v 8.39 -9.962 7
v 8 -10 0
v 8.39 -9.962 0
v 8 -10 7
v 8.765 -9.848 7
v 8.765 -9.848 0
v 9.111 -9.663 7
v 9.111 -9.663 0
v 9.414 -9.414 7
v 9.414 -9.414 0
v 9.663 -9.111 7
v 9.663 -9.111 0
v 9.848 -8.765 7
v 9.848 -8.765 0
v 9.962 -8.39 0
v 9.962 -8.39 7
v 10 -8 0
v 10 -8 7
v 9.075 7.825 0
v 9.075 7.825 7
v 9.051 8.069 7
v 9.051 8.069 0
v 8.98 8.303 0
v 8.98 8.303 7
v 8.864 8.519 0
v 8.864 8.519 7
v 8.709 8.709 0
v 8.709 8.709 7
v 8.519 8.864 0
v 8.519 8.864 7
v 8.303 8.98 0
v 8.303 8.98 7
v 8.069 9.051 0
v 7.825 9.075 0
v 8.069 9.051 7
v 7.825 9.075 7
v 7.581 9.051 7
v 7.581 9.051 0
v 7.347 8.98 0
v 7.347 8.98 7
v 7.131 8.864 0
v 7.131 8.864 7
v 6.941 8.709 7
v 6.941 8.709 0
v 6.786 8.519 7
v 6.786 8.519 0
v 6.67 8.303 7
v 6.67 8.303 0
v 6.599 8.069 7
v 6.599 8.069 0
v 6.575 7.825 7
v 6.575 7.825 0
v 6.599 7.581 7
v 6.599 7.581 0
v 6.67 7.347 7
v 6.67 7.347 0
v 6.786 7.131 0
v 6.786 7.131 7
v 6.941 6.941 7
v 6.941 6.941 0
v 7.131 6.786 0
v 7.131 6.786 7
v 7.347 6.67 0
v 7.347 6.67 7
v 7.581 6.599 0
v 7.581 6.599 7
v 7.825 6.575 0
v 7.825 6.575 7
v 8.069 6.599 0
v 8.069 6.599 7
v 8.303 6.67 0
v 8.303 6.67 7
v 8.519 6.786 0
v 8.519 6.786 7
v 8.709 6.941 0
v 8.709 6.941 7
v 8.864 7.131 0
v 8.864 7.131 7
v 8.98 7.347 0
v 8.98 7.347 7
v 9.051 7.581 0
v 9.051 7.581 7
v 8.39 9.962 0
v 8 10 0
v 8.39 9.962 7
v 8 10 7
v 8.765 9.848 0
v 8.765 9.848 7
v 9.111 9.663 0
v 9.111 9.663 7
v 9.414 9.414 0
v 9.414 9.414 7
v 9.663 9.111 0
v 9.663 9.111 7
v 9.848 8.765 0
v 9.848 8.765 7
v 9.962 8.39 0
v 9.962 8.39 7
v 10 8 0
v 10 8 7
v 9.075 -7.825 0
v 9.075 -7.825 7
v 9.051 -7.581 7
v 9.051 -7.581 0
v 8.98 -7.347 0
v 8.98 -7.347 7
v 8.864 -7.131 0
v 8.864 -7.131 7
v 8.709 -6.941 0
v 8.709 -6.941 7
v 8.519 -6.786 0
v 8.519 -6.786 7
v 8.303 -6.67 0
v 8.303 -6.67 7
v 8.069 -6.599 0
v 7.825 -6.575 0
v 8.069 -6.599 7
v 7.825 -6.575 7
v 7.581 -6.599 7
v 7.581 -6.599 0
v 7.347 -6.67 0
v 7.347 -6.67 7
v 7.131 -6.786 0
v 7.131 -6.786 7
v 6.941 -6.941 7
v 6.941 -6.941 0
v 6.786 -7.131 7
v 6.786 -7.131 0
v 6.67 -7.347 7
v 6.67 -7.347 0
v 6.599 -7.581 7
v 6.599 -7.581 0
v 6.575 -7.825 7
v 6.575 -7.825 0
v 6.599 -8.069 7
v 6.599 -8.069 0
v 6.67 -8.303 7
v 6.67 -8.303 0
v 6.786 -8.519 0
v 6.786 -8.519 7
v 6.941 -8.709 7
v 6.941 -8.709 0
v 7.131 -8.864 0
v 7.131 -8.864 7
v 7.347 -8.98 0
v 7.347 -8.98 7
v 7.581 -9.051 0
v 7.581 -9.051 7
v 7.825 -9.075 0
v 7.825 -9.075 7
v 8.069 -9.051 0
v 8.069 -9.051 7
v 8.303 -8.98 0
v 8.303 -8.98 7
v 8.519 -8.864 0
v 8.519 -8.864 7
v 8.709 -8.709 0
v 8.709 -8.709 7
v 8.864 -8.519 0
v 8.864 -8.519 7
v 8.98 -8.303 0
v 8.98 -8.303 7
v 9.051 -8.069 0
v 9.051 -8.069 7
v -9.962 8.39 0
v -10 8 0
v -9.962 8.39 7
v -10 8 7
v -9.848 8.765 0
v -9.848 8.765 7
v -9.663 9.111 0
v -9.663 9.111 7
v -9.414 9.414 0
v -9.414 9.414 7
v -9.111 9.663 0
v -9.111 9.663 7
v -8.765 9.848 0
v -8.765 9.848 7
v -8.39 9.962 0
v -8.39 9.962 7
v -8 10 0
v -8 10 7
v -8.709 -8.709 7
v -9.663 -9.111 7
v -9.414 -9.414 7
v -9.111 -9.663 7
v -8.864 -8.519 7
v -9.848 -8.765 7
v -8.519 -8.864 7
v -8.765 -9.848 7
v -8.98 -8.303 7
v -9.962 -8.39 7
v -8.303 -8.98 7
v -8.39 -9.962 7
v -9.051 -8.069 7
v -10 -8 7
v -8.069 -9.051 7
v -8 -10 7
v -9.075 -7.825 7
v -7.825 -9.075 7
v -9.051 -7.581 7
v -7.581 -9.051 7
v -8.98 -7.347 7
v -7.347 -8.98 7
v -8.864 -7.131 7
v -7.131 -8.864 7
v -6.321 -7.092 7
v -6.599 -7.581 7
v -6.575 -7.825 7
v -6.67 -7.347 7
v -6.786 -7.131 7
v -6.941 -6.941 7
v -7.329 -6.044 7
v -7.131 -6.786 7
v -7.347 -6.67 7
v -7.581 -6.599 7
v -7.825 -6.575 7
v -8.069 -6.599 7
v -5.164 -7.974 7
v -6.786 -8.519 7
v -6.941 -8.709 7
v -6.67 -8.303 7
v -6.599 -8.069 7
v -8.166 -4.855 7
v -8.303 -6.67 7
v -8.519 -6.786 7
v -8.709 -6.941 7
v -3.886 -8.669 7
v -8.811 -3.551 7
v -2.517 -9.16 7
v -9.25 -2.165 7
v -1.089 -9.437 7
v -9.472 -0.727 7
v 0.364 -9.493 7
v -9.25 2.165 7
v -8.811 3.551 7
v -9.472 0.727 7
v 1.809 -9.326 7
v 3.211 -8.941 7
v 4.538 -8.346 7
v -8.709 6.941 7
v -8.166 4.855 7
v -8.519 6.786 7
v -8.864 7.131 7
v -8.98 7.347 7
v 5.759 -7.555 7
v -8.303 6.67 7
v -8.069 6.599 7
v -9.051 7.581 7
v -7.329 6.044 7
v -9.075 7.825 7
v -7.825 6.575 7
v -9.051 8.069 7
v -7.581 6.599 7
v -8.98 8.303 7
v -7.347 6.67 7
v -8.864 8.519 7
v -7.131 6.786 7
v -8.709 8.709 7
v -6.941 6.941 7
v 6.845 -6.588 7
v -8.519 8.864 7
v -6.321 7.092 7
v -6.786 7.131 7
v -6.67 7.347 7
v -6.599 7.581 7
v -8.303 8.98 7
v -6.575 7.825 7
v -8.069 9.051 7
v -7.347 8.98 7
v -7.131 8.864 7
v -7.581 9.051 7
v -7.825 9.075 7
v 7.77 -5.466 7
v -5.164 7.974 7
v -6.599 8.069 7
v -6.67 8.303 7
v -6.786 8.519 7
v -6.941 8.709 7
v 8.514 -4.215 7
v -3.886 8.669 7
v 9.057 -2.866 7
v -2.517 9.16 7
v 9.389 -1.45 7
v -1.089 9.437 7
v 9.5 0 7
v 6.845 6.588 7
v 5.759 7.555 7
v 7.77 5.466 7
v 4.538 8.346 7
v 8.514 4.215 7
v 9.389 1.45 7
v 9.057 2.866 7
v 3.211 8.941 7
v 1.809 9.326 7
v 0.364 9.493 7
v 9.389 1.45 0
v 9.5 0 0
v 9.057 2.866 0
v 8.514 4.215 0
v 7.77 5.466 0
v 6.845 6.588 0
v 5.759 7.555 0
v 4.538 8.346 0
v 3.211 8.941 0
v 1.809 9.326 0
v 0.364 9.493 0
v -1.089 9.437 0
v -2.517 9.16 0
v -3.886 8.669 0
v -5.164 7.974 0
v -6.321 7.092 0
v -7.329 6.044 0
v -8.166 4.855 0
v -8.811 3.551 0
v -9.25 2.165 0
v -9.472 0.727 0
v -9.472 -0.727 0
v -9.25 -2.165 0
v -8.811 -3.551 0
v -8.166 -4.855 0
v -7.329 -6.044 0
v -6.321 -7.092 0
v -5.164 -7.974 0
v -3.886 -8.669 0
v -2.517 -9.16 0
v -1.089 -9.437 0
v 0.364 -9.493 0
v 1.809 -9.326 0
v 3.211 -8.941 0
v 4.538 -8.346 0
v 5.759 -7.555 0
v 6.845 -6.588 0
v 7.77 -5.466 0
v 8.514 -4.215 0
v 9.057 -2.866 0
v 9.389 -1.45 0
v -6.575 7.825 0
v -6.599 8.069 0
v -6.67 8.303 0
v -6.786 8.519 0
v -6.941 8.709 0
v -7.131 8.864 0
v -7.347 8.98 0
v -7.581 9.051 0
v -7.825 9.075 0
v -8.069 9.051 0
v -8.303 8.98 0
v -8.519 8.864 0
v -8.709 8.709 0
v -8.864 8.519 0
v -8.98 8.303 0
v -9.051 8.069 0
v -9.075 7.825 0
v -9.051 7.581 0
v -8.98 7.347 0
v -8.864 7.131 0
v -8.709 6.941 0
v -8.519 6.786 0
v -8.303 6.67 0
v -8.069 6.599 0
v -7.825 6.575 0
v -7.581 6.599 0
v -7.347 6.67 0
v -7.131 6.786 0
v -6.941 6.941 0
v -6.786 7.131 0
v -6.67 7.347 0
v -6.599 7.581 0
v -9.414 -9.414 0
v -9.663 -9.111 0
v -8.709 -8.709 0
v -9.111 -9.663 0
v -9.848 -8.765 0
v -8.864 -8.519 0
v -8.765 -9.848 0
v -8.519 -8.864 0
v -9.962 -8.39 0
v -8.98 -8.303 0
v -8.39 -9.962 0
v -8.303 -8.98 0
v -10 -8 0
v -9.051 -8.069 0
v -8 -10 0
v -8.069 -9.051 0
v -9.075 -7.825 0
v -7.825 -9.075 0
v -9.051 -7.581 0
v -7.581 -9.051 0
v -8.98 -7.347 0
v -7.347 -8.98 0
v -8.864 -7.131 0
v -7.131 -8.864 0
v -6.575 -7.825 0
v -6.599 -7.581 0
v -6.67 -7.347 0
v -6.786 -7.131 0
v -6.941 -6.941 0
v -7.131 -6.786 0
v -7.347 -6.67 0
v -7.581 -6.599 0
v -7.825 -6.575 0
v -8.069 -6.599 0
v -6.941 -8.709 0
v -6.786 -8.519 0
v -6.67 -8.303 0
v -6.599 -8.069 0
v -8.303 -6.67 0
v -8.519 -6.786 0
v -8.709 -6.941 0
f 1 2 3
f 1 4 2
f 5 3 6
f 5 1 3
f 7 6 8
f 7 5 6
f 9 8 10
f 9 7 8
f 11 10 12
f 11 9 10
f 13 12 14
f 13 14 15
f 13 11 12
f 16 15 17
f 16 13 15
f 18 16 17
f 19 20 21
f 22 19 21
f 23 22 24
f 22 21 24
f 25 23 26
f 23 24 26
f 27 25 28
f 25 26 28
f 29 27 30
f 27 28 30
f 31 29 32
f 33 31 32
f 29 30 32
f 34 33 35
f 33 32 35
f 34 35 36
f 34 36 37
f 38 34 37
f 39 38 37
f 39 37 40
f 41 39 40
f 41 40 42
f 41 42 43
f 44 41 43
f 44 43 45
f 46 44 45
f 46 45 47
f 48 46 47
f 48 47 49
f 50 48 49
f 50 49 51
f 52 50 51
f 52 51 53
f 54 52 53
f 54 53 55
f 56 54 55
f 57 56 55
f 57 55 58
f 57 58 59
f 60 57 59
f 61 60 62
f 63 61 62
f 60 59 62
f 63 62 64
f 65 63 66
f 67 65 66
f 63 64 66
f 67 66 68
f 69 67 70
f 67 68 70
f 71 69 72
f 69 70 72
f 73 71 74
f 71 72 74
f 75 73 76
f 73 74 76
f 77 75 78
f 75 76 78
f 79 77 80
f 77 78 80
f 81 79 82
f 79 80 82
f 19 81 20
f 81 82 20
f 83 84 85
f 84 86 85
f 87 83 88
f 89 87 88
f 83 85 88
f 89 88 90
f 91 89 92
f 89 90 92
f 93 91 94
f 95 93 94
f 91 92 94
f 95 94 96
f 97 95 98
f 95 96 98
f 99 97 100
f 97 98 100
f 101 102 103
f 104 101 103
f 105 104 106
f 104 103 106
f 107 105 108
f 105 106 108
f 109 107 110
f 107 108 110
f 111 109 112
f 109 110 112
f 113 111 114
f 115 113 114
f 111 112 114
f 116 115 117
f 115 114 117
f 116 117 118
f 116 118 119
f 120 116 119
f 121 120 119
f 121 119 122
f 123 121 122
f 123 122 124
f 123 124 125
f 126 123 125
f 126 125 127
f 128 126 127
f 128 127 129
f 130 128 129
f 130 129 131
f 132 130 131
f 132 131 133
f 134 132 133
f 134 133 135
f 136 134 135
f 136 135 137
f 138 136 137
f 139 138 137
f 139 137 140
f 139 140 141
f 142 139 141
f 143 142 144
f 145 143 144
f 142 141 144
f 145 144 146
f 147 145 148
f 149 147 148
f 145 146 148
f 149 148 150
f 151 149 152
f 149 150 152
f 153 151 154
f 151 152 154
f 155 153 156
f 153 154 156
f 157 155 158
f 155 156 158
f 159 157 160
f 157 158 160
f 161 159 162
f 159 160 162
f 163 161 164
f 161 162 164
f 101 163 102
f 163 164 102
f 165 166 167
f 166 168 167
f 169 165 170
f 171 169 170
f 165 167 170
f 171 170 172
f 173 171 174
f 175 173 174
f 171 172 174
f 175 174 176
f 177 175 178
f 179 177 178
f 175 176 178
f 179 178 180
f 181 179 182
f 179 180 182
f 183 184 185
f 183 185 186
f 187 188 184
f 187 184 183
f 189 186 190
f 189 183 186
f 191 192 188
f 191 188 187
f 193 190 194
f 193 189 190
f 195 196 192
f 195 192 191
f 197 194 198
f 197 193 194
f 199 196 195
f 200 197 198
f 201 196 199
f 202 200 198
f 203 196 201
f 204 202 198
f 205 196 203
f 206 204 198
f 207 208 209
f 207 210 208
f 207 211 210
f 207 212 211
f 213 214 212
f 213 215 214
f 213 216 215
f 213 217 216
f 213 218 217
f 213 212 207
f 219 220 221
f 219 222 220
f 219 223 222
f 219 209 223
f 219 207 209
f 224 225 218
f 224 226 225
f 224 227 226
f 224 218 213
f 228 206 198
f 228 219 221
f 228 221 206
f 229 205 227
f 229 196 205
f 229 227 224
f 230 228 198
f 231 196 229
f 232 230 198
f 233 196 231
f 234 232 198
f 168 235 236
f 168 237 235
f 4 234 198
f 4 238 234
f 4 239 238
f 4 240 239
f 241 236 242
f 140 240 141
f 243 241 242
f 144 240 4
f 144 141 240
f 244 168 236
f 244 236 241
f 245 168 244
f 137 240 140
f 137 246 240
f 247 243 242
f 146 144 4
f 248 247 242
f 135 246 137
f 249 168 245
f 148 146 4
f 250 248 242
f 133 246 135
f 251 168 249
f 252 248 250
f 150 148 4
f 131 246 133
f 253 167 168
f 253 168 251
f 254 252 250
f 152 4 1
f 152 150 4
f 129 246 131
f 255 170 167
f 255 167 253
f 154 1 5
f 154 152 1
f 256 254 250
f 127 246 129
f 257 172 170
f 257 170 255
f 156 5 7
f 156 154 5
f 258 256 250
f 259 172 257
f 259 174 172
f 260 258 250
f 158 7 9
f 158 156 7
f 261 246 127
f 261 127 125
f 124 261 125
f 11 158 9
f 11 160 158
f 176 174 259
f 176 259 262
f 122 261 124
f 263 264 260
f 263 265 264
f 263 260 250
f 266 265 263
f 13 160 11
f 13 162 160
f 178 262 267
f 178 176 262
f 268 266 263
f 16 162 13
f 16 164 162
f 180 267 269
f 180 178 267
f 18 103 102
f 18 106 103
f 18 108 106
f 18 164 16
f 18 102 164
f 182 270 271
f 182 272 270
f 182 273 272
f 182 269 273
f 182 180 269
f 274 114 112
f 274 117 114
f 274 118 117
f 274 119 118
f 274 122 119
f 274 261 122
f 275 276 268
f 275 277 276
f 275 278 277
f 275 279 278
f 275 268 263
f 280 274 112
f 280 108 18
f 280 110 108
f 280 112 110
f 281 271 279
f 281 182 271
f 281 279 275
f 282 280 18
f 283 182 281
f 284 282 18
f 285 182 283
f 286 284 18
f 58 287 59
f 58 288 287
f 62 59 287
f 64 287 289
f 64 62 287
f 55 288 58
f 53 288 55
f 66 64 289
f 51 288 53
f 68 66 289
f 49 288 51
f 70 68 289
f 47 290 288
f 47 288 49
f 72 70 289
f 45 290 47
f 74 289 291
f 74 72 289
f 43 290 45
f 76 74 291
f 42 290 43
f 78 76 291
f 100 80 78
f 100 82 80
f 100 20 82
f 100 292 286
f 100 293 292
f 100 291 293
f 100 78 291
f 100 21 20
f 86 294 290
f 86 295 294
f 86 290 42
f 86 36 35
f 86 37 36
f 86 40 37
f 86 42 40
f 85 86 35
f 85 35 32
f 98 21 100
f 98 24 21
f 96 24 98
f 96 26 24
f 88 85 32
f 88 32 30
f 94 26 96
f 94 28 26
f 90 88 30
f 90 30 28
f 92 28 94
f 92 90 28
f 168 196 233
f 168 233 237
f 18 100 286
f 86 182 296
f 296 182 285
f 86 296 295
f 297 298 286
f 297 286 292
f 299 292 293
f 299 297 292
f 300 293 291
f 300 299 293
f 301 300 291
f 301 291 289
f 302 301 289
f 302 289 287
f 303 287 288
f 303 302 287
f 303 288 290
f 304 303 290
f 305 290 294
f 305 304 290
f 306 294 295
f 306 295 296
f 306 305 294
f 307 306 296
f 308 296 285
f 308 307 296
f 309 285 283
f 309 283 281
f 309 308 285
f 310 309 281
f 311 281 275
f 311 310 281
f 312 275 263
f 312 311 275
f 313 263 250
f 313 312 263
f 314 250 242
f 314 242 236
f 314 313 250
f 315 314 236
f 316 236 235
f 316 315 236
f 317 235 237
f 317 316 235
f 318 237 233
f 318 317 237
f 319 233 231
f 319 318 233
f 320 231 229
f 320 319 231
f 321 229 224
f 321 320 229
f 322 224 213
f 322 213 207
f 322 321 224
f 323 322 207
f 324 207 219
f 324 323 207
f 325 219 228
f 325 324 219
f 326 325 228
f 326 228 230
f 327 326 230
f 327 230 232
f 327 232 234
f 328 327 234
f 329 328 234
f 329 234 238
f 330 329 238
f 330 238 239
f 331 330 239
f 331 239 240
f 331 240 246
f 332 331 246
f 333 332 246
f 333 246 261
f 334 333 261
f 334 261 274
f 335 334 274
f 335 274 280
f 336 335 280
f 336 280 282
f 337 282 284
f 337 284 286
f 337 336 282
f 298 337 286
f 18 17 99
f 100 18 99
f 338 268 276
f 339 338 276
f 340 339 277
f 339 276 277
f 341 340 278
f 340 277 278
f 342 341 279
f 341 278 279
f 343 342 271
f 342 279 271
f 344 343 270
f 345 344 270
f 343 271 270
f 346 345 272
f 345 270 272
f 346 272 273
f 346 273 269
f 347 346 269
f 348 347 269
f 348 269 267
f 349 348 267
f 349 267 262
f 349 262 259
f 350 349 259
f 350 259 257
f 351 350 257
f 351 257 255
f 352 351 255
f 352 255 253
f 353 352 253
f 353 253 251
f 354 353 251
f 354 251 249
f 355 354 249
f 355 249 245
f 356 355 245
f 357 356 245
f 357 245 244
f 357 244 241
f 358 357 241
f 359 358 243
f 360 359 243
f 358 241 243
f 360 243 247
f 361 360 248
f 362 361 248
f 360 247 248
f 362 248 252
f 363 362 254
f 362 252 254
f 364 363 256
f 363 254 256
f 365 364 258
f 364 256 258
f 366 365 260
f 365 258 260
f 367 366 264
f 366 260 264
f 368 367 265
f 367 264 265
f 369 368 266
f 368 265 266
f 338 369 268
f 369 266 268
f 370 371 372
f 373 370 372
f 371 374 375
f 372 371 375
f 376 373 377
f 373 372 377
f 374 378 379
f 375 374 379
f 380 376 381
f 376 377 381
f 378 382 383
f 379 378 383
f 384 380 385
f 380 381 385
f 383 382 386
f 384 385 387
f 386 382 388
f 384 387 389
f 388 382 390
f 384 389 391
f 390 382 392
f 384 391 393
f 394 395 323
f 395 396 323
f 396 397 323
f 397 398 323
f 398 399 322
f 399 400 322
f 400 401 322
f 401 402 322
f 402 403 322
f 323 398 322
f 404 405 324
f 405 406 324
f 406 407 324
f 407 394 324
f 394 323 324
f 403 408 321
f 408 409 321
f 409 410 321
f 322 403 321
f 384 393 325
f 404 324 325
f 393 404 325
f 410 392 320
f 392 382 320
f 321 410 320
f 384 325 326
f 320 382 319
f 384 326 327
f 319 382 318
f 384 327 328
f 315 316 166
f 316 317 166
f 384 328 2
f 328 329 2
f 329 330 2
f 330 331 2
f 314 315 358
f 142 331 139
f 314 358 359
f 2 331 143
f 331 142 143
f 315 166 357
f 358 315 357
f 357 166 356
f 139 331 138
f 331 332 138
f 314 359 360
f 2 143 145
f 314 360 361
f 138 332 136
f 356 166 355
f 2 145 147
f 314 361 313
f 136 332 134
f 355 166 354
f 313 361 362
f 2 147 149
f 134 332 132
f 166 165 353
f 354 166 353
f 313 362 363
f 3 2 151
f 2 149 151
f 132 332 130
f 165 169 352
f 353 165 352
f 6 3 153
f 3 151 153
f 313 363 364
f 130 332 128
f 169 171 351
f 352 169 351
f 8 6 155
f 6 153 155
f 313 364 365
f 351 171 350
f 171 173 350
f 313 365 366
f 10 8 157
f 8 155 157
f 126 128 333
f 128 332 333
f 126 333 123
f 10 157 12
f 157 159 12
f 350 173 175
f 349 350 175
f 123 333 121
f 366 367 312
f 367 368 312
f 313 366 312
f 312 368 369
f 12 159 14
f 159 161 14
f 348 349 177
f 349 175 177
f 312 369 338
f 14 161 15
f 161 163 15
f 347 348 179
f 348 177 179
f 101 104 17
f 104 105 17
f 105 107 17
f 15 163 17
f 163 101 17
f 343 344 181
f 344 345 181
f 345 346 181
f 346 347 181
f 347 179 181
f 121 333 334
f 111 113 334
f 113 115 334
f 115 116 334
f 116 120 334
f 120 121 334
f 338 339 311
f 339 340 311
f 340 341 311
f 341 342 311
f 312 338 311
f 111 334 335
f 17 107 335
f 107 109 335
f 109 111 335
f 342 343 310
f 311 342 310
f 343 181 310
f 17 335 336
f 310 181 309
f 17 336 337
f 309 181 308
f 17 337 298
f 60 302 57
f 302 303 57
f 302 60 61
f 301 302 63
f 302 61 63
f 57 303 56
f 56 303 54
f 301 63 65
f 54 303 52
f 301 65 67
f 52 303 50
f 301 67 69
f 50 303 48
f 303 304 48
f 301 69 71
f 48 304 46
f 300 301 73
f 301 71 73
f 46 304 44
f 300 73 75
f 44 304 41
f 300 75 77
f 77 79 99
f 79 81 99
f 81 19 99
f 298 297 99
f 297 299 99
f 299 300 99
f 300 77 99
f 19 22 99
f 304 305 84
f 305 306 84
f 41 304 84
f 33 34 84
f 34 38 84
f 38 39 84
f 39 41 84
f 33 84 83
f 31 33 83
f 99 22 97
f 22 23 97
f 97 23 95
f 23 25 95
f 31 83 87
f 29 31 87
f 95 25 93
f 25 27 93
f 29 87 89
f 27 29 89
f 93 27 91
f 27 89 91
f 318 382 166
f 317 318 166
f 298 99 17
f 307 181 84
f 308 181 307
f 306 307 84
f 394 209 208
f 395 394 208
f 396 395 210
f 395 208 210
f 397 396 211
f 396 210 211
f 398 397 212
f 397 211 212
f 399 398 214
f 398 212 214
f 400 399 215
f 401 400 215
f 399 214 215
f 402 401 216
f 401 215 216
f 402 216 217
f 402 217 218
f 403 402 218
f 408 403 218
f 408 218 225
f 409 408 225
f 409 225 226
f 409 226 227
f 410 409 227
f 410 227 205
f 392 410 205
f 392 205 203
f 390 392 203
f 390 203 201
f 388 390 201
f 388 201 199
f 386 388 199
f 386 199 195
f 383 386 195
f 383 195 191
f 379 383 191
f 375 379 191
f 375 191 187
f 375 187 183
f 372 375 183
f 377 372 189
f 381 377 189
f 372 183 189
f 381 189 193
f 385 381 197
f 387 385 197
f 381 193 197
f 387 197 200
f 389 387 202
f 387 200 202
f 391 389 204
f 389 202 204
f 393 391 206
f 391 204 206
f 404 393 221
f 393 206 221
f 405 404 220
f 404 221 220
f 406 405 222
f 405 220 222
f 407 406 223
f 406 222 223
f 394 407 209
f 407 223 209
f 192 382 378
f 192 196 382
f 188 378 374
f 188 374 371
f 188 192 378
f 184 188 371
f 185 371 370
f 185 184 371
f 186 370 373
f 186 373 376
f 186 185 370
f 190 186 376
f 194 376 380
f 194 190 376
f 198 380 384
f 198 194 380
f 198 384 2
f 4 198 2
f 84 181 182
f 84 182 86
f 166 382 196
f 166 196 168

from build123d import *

# Parameters (mm, degrees)
SKETCH1_W           = 20
SKETCH1_H           = 20
SKETCH1_R           = 9.5
BOSS_EXTRUDE1_DEPTH = 7
FILLET1_R           = 2
SKETCH2_R           = 1.25
CUT_EXTRUDE1_DEPTH  = 16.779733838


with BuildPart() as part:
    # Sketch1 → Boss-Extrude1 (new body)
    with BuildSketch(Plane.XY):
        Rectangle(SKETCH1_W, SKETCH1_H)
        Circle(SKETCH1_R, mode=Mode.SUBTRACT)
    extrude(amount=BOSS_EXTRUDE1_DEPTH)

    # Fillet1
    fillet1_edges = [part.edges().sort_by_distance(p)[0] for p in [
        (10, -10, 3.5),
        (-10, -10, 3.5),
        (-10, 10, 3.5),
        (10, 10, 3.5),
    ]]
    fillet(fillet1_edges, radius=FILLET1_R)

    # Sketch2 → Cut-Extrude1 (cut, through all)
    with BuildSketch(Plane.XY.offset(7)):
        with Locations((-7.825, 7.825)):
            Circle(SKETCH2_R)
        with Locations((7.825, 7.825)):
            Circle(SKETCH2_R)
        with Locations((7.825, -7.825)):
            Circle(SKETCH2_R)
        with Locations((-7.825, -7.825)):
            Circle(SKETCH2_R)
    extrude(amount=-CUT_EXTRUDE1_DEPTH, mode=Mode.SUBTRACT)


solid = part.part
